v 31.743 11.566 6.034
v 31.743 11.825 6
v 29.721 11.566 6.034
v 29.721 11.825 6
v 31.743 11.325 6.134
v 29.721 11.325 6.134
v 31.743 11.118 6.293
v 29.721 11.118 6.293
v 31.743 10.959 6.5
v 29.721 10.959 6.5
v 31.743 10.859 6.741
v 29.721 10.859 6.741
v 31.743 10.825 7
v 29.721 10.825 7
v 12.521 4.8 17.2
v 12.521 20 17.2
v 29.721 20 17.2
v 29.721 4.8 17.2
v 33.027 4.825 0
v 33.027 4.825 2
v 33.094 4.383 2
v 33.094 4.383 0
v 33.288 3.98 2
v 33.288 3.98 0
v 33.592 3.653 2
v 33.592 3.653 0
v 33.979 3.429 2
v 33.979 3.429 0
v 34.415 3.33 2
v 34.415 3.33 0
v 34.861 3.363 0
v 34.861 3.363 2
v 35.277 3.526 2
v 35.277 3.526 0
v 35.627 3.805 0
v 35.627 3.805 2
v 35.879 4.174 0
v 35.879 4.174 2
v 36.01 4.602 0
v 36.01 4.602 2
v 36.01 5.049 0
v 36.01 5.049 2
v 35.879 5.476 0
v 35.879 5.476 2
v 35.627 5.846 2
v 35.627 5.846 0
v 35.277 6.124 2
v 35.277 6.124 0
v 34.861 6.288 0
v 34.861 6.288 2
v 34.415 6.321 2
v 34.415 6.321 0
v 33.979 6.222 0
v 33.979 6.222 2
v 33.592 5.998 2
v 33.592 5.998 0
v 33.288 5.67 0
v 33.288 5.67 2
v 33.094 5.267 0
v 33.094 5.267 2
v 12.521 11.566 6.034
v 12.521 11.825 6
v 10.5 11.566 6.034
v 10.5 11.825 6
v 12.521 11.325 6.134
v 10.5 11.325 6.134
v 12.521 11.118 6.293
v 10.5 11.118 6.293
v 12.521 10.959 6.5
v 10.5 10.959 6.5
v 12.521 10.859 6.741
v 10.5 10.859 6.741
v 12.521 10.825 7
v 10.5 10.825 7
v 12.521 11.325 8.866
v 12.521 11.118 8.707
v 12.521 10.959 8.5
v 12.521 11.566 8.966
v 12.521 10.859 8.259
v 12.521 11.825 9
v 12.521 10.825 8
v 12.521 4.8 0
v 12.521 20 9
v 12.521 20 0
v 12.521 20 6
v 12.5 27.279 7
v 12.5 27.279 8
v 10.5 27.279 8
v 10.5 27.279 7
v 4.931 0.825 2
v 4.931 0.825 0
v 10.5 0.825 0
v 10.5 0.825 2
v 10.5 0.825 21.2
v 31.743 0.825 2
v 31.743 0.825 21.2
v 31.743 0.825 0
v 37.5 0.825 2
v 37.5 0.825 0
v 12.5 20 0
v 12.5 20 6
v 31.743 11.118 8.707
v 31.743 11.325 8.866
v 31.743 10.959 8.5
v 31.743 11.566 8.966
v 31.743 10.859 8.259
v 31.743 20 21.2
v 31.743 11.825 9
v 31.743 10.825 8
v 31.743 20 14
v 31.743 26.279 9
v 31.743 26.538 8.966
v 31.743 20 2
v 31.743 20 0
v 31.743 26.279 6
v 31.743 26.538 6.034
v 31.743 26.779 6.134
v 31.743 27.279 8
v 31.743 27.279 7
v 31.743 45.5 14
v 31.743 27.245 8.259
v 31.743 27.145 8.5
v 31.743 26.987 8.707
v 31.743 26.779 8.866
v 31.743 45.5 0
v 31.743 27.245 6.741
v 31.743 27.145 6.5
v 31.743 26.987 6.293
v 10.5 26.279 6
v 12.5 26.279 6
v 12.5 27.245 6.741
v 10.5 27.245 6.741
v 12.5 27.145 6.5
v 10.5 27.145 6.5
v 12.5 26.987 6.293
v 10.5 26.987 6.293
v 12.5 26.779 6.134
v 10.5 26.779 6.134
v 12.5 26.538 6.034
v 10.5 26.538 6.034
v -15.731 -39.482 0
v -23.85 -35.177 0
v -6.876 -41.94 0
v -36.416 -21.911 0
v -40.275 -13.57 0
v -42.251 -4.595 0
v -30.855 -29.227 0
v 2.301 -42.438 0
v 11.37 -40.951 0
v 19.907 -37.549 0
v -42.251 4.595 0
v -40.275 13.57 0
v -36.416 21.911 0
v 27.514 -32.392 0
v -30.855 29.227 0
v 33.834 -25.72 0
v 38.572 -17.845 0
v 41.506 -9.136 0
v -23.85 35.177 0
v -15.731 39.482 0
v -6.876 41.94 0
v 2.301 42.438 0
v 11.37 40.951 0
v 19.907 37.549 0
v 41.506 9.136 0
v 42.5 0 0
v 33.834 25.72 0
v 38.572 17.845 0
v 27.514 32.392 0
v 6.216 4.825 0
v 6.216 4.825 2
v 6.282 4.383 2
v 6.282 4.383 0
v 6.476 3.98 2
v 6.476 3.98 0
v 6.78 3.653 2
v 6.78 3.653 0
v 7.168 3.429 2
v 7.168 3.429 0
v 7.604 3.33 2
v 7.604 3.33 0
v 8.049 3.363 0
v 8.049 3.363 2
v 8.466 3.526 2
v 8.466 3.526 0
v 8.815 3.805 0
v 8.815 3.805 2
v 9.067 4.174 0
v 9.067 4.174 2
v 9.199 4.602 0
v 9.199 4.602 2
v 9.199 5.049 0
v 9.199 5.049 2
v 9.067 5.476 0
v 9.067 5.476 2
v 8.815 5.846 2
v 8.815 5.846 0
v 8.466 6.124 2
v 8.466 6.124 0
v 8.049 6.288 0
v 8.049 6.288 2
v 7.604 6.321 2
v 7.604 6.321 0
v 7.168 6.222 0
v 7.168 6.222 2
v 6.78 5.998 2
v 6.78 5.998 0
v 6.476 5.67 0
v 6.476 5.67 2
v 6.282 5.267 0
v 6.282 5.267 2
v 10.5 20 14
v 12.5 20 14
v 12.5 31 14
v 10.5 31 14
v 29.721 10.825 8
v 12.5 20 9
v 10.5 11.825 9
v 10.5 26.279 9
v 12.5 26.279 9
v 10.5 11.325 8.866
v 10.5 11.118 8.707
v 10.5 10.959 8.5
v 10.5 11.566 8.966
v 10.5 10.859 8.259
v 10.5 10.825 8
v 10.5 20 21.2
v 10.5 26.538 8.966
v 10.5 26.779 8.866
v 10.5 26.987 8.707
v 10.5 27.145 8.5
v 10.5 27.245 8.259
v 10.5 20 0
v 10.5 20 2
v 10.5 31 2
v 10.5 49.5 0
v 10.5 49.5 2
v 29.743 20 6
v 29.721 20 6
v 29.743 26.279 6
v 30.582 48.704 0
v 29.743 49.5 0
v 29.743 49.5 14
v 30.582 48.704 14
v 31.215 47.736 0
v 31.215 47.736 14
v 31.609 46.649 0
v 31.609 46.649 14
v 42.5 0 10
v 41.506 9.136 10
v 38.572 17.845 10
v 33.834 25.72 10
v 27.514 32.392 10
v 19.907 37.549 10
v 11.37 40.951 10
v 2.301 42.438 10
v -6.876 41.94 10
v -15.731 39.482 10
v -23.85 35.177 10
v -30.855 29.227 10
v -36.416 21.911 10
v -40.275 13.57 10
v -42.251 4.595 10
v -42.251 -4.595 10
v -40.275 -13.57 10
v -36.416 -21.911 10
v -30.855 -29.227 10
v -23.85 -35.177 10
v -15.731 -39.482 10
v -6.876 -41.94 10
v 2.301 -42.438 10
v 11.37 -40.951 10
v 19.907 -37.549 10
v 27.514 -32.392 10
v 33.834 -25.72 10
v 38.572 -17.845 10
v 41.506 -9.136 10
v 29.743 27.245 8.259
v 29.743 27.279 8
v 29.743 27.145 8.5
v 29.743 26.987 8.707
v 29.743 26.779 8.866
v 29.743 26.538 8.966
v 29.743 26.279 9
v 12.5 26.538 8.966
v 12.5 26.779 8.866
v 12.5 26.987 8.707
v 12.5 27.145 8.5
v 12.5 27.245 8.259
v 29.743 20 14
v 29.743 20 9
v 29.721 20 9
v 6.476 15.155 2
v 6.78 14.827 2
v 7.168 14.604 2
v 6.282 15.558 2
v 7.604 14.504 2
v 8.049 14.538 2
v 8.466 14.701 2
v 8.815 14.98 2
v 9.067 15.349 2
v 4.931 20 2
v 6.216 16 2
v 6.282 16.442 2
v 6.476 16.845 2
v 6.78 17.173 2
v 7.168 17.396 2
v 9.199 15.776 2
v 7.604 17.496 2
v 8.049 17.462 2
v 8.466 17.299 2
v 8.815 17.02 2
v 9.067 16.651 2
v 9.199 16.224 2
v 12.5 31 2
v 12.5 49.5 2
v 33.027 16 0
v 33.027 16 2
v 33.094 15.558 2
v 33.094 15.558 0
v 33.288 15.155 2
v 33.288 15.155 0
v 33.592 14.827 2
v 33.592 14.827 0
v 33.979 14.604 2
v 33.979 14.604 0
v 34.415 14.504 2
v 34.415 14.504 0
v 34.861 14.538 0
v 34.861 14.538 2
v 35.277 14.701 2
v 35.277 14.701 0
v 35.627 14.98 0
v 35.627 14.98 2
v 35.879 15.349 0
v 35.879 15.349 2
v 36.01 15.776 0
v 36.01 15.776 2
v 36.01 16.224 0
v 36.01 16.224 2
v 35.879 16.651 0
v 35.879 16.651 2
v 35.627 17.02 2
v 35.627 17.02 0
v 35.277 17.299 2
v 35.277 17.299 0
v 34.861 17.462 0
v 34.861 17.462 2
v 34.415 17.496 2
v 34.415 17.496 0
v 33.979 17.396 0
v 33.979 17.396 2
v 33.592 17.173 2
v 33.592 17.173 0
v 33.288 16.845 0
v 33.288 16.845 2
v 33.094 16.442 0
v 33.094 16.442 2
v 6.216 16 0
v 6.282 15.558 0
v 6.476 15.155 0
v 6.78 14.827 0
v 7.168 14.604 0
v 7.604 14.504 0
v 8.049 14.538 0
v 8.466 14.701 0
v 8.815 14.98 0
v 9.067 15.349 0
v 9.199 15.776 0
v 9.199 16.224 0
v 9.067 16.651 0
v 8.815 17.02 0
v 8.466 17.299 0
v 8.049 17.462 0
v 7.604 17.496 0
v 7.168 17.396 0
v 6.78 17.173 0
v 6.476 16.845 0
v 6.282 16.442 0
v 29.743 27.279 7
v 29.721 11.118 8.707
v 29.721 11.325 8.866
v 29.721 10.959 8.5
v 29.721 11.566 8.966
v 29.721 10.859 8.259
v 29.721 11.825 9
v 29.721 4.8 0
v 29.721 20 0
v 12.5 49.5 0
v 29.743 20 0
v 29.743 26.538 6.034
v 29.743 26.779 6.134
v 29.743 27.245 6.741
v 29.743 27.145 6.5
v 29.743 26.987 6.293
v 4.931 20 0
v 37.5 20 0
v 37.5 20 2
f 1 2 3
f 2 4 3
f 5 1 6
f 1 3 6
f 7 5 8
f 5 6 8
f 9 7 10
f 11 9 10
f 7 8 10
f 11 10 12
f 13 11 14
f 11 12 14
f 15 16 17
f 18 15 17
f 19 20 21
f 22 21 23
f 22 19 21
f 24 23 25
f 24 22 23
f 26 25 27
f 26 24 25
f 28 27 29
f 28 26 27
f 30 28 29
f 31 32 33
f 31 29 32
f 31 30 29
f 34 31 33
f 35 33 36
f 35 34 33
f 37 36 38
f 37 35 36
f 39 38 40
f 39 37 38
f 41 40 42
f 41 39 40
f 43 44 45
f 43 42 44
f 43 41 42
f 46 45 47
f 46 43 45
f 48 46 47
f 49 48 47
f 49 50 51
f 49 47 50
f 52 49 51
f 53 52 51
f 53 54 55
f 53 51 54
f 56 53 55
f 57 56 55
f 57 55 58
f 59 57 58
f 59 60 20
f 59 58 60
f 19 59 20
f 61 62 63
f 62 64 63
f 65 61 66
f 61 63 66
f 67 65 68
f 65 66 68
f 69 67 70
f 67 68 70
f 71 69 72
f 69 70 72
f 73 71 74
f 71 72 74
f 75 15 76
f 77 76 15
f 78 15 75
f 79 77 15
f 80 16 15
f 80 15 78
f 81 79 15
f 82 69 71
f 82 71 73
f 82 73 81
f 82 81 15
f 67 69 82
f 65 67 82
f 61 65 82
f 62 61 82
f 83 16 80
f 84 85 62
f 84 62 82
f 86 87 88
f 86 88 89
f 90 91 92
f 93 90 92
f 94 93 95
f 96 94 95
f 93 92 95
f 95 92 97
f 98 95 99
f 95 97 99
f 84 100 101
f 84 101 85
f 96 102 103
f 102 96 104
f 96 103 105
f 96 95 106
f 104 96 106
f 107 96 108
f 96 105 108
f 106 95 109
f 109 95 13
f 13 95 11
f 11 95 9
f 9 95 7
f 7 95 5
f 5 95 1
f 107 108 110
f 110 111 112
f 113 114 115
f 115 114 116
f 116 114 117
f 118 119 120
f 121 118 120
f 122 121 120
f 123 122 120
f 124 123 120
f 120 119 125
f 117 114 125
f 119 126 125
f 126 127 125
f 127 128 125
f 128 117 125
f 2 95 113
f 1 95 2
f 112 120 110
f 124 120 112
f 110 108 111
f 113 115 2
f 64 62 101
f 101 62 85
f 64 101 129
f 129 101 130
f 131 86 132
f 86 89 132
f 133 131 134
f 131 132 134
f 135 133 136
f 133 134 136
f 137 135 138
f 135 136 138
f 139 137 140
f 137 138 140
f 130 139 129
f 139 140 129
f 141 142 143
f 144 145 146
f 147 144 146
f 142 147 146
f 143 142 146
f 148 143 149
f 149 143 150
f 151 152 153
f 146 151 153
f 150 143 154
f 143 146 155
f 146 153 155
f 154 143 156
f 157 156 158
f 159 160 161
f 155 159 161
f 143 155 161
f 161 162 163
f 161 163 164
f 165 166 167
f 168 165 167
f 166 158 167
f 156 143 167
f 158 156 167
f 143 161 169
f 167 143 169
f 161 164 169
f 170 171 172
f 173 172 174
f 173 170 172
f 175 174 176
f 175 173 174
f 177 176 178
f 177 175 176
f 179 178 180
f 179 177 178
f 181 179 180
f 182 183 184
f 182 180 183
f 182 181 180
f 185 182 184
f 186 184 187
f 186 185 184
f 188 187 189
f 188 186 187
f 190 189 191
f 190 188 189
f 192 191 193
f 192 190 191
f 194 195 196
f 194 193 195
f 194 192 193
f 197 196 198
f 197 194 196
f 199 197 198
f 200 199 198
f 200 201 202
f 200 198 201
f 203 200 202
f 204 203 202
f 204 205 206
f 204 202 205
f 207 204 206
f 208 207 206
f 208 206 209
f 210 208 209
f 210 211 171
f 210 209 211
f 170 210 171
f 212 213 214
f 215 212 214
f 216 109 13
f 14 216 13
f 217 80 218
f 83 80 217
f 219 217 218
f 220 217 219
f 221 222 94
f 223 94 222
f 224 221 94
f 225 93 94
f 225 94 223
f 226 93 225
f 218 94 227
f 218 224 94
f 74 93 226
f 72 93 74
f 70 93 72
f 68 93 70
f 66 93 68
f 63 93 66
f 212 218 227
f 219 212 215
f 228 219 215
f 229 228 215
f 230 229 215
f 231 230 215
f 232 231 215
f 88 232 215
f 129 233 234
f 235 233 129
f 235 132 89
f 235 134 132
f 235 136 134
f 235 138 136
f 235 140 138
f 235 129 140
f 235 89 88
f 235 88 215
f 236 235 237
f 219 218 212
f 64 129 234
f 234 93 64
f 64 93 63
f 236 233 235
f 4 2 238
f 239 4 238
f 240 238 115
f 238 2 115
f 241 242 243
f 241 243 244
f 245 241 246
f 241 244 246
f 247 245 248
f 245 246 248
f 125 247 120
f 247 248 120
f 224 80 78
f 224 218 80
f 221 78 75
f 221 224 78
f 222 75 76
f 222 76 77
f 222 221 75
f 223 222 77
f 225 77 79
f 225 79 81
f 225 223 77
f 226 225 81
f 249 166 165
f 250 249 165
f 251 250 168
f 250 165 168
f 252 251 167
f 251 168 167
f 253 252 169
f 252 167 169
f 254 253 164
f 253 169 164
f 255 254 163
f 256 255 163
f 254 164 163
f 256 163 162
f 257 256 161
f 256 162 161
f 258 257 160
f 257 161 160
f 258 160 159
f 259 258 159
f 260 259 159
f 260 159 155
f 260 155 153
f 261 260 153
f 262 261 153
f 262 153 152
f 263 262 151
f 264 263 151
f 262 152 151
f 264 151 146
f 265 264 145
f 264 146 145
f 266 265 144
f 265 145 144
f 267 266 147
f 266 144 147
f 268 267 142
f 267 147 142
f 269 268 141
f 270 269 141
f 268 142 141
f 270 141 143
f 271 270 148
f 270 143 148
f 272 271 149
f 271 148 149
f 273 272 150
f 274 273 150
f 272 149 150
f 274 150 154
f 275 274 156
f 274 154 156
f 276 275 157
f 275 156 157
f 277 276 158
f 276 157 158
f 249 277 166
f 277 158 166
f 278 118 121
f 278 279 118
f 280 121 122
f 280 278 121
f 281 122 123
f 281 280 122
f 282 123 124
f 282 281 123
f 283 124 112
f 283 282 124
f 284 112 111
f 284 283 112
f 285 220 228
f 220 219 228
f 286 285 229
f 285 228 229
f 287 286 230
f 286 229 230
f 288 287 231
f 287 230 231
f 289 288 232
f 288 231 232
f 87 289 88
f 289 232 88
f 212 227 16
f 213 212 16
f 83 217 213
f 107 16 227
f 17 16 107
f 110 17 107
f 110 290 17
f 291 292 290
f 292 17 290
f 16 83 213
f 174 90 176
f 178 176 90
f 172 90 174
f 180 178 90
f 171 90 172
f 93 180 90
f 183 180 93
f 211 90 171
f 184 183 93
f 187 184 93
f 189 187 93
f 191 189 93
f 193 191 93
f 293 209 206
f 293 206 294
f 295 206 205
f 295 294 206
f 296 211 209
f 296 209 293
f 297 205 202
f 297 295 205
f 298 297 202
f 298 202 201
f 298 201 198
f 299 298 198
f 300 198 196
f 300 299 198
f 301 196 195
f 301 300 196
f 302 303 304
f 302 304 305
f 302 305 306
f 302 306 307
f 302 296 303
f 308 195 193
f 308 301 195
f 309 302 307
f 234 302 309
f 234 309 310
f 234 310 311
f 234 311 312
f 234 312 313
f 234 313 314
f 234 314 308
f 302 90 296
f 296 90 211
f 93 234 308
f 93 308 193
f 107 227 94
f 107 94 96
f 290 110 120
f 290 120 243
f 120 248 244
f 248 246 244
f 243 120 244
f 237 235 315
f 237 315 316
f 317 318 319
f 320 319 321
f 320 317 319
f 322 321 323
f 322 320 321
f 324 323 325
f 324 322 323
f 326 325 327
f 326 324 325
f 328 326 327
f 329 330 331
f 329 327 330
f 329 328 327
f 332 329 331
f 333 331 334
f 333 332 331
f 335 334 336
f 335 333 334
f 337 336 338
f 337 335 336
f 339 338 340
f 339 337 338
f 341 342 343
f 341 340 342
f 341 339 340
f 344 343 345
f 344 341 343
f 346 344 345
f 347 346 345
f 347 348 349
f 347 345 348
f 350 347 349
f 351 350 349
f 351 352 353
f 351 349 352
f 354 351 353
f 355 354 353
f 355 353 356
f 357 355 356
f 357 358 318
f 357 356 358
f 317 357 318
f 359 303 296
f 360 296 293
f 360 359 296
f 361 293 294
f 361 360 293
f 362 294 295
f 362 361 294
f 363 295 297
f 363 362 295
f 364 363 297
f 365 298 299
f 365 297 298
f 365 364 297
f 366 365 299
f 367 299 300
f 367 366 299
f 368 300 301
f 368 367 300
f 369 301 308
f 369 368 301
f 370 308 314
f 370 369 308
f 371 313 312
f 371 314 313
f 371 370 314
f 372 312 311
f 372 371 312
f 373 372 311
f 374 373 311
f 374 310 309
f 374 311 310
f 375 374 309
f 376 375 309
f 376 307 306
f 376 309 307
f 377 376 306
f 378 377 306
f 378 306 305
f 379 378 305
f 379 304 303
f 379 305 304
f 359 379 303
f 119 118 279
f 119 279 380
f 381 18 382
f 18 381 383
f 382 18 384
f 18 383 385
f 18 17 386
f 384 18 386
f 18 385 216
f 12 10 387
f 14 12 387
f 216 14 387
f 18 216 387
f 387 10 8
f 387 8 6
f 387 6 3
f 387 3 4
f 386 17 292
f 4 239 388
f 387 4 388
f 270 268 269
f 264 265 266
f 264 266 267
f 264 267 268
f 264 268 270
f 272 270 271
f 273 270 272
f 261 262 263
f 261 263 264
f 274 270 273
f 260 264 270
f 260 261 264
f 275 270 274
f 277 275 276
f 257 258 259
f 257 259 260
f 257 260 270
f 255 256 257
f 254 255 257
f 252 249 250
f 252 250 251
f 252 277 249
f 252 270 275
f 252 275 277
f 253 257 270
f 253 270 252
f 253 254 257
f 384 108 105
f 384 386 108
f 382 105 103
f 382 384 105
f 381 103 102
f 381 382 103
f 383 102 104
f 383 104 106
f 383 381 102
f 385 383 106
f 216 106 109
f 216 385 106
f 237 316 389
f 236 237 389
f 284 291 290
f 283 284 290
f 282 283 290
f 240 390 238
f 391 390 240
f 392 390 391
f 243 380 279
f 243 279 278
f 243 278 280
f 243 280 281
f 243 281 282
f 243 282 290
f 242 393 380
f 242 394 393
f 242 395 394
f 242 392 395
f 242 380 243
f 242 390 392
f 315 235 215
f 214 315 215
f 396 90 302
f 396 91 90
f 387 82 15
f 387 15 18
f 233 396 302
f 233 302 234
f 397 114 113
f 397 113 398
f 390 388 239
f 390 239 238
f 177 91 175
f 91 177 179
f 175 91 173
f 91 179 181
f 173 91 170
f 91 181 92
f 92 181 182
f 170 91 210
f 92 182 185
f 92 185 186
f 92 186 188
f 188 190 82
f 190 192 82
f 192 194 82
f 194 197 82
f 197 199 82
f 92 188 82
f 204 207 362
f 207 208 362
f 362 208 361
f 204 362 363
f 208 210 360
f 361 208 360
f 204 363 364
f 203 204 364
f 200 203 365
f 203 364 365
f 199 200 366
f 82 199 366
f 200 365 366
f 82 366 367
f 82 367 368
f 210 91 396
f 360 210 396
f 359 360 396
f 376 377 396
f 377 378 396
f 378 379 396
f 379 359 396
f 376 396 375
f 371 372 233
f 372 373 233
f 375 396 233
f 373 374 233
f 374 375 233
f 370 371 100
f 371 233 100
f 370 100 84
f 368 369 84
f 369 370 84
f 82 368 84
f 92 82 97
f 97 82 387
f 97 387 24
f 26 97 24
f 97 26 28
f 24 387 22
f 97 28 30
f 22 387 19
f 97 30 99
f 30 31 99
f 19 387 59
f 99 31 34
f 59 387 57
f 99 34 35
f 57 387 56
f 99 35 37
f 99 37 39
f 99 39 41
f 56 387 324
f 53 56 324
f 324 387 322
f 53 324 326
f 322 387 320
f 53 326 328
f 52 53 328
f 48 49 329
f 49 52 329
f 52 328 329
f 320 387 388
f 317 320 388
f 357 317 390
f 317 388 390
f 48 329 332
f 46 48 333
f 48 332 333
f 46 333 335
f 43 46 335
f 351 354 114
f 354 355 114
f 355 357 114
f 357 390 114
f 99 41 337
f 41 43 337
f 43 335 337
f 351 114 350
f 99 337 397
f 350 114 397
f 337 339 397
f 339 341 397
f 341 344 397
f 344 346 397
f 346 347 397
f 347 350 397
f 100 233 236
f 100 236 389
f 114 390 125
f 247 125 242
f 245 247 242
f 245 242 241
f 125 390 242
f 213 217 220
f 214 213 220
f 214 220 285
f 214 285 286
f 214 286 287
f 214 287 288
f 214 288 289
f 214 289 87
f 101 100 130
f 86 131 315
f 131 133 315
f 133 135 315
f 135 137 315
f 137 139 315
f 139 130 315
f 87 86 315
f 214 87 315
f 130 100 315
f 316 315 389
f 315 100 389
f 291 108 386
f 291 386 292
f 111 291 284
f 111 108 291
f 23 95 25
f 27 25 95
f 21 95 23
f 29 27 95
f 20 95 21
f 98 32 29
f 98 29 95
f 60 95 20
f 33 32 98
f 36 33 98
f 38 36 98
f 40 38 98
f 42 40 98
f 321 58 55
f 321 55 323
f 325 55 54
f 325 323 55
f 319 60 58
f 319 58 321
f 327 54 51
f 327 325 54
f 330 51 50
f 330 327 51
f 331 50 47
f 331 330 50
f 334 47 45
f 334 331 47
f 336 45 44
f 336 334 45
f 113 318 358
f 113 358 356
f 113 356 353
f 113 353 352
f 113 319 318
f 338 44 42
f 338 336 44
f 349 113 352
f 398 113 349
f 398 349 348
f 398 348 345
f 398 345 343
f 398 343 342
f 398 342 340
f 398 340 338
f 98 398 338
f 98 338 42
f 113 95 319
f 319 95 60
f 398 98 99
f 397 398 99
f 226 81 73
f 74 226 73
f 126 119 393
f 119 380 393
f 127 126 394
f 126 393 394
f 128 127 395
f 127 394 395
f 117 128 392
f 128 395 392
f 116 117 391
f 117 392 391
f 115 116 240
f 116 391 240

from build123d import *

# Parameters (mm, degrees)
SKETCH4_R           = 42.5
BASE_DEPTH          = 10
SKETCH10_W          = 21.242861366
SKETCH10_H          = 19.174682453
BOSS_EXTRUDE1_DEPTH = 21.2
SKETCH11_W          = 32.5685853
SKETCH11_H          = 48.674682453
BOSS_EXTRUDE2_DEPTH = 2
SKETCH13_W          = 17.2
SKETCH13_H          = 17.2
CUT_EXTRUDE2_DEPTH  = 15.2
BOSS_EXTRUDE4_REACH = 98.435
SKETCH17_W          = 12
SKETCH17_H          = 29.5
SKETCH12_W          = 5.5685853
SKETCH12_H          = 32.757849033
SKETCH12_W_2        = 17.242861366
SKETCH12_W_3        = 5.757138634
CUT_EXTRUDE3_DEPTH  = 14
CUT_EXTRUDE4_REACH  = 98.435
SKETCH18_W          = 3
SKETCH18_H          = 16.454130829
FILLET1_R           = 5
FILLET2_R           = 1
SKETCH19_R          = 1.5
CUT_EXTRUDE5_DEPTH  = 10
SKETCH21_W          = 12
SKETCH21_H          = 18.5
CUT_EXTRUDE6_DEPTH  = 2


with BuildPart() as part:
    # Sketch4 → base (new body)
    with BuildSketch(Plane.XY):
        Circle(SKETCH4_R)
    extrude(amount=BASE_DEPTH)


with BuildPart() as body_2:
    # Sketch10 → Boss-Extrude1 (new body)
    with BuildSketch(Plane.XY):
        with Locations((21.121430683, 10.412658774)):
            Rectangle(SKETCH10_W, SKETCH10_H)
    extrude(amount=BOSS_EXTRUDE1_DEPTH)

    # Sketch11 → Boss-Extrude2 (add)
    with BuildSketch(Plane.XY):
        with Locations((21.21570735, 25.162658773)):
            Rectangle(SKETCH11_W, SKETCH11_H)
    extrude(amount=BOSS_EXTRUDE2_DEPTH)

    # Sketch13 → Cut-Extrude2 (cut)
    with BuildSketch(Plane(origin=(0, 20, 0), x_dir=(1, 0, 0), z_dir=(0, 1, 0))):
        with Locations((21.121430683, -8.6)):
            Rectangle(SKETCH13_W, SKETCH13_H)
    extrude(amount=-CUT_EXTRUDE2_DEPTH, mode=Mode.SUBTRACT)

    # Boss-Extrude4: up to this face of the body (flat: up to its plane)
    boss_extrude4_end = Plane(body_2.part.faces().sort_by_distance((4.9314147, 25.162658774, 1))[0])
    # Sketch17 → Boss-Extrude4 (add, up to the picked face)
    with BuildSketch(Plane(origin=(37.5, 0, 0), x_dir=(0, 0, -1), z_dir=(1, 0, 0)), mode=Mode.PRIVATE) as boss_extrude4_sk1:
        with Locations((-8, 34.75)):
            Rectangle(SKETCH17_W, SKETCH17_H)
    boss_extrude4_tool1 = split(extrude(boss_extrude4_sk1.sketch, amount=-BOSS_EXTRUDE4_REACH, mode=Mode.PRIVATE), bisect_by=boss_extrude4_end, keep=Keep.BOTH, mode=Mode.PRIVATE)
    add(boss_extrude4_tool1.solids().sort_by(Axis((37.5, 34.75, 8), (-1, 0, 0)))[0])

    # Sketch12 → Cut-Extrude3 (cut)
    with BuildSketch(Plane.XY):
        with Locations((7.71570735, 36.378924517)):
            Rectangle(SKETCH12_W, SKETCH12_H)
        with Locations((21.121430683, 36.378924517)):
            Rectangle(SKETCH12_W_2, SKETCH12_H)
        with Locations((34.621430683, 36.378924517)):
            Rectangle(SKETCH12_W_3, SKETCH12_H)
    extrude(amount=CUT_EXTRUDE3_DEPTH, mode=Mode.SUBTRACT)

    # Cut-Extrude4: up to this face of the body (flat: up to its plane)
    cut_extrude4_end = Plane(body_2.part.faces().sort_by_distance((10.5, 23.279933566, 9.167956849))[0])
    # Sketch18 → Cut-Extrude4 (cut, up to the picked face)
    with BuildSketch(Plane(origin=(37.5, 0, 0), x_dir=(0, 0, -1), z_dir=(1, 0, 0)), mode=Mode.PRIVATE) as cut_extrude4_sk1:
        with Locations((-7.5, 19.052382962)):
            Rectangle(SKETCH18_W, SKETCH18_H)
    cut_extrude4_tool1 = split(extrude(cut_extrude4_sk1.sketch, amount=-CUT_EXTRUDE4_REACH, mode=Mode.PRIVATE), bisect_by=cut_extrude4_end, keep=Keep.BOTH, mode=Mode.PRIVATE)
    add(cut_extrude4_tool1.solids().sort_by(Axis((37.5, 19.052383, 7.5), (-1, 0, 0)))[0], mode=Mode.SUBTRACT)

    # Fillet1
    # the kernel refuses this fillet: 5 mm, written as the material it takes off along each edge
    with BuildSketch(Plane(origin=(31.742861366, 49.5, 24), x_dir=(0, -1, 0), z_dir=(0, 0, -1))) as fillet1_piece_1:
        with BuildLine():
            CenterArc((4, 5), FILLET1_R, 216.869897646, 53.130102354)
            Line((0, 2), (-0.08, 1.94))
            ThreePointArc((-0.08, 1.94), (-0.1, 1), (-0.1, 0))
            Line((-0.1, 0), (0, -0.1))
            Line((0, -0.1), (4, -0.1))
            Line((4, -0.1), (4, 0))
        make_face()
    extrude(amount=34, mode=Mode.SUBTRACT)

    # Fillet2
    fillet2_edges = [body_2.edges().sort_by_distance(p)[0] for p in [
        (30.732146025, 10.825317547, 6),
        (11.510715342, 10.825317547, 6),
        (30.742861366, 27.279448376, 6),
        (11.5, 27.279448376, 6),
        (30.732146025, 10.825317547, 9),
        (11.510715342, 10.825317547, 9),
        (30.742861366, 27.279448376, 9),
        (11.5, 27.279448376, 9),
    ]]
    fillet(fillet2_edges, radius=FILLET2_R)

    # Sketch19 → Cut-Extrude5 (cut)
    with BuildSketch(Plane.XY):
        with Locations(Location((7.71570735, 16, 0), (0, 0, 180))):
            Circle(SKETCH19_R)
        with Locations(Location((7.71570735, 4.825317547, 0), (0, 0, 180))):
            Circle(SKETCH19_R)
        with Locations(Location((34.527154016, 4.825317547, 0), (0, 0, 180))):
            Circle(SKETCH19_R)
        with Locations(Location((34.527154016, 16, 0), (0, 0, 180))):
            Circle(SKETCH19_R)
    extrude(amount=CUT_EXTRUDE5_DEPTH, mode=Mode.SUBTRACT)

    # Sketch21 → Cut-Extrude6 (cut)
    with BuildSketch(Plane.ZY.offset(-10.5)):
        with Locations((8, 40.25)):
            Rectangle(SKETCH21_W, SKETCH21_H)
    extrude(amount=-CUT_EXTRUDE6_DEPTH, mode=Mode.SUBTRACT)


solid = Compound([part.part, body_2.part])
